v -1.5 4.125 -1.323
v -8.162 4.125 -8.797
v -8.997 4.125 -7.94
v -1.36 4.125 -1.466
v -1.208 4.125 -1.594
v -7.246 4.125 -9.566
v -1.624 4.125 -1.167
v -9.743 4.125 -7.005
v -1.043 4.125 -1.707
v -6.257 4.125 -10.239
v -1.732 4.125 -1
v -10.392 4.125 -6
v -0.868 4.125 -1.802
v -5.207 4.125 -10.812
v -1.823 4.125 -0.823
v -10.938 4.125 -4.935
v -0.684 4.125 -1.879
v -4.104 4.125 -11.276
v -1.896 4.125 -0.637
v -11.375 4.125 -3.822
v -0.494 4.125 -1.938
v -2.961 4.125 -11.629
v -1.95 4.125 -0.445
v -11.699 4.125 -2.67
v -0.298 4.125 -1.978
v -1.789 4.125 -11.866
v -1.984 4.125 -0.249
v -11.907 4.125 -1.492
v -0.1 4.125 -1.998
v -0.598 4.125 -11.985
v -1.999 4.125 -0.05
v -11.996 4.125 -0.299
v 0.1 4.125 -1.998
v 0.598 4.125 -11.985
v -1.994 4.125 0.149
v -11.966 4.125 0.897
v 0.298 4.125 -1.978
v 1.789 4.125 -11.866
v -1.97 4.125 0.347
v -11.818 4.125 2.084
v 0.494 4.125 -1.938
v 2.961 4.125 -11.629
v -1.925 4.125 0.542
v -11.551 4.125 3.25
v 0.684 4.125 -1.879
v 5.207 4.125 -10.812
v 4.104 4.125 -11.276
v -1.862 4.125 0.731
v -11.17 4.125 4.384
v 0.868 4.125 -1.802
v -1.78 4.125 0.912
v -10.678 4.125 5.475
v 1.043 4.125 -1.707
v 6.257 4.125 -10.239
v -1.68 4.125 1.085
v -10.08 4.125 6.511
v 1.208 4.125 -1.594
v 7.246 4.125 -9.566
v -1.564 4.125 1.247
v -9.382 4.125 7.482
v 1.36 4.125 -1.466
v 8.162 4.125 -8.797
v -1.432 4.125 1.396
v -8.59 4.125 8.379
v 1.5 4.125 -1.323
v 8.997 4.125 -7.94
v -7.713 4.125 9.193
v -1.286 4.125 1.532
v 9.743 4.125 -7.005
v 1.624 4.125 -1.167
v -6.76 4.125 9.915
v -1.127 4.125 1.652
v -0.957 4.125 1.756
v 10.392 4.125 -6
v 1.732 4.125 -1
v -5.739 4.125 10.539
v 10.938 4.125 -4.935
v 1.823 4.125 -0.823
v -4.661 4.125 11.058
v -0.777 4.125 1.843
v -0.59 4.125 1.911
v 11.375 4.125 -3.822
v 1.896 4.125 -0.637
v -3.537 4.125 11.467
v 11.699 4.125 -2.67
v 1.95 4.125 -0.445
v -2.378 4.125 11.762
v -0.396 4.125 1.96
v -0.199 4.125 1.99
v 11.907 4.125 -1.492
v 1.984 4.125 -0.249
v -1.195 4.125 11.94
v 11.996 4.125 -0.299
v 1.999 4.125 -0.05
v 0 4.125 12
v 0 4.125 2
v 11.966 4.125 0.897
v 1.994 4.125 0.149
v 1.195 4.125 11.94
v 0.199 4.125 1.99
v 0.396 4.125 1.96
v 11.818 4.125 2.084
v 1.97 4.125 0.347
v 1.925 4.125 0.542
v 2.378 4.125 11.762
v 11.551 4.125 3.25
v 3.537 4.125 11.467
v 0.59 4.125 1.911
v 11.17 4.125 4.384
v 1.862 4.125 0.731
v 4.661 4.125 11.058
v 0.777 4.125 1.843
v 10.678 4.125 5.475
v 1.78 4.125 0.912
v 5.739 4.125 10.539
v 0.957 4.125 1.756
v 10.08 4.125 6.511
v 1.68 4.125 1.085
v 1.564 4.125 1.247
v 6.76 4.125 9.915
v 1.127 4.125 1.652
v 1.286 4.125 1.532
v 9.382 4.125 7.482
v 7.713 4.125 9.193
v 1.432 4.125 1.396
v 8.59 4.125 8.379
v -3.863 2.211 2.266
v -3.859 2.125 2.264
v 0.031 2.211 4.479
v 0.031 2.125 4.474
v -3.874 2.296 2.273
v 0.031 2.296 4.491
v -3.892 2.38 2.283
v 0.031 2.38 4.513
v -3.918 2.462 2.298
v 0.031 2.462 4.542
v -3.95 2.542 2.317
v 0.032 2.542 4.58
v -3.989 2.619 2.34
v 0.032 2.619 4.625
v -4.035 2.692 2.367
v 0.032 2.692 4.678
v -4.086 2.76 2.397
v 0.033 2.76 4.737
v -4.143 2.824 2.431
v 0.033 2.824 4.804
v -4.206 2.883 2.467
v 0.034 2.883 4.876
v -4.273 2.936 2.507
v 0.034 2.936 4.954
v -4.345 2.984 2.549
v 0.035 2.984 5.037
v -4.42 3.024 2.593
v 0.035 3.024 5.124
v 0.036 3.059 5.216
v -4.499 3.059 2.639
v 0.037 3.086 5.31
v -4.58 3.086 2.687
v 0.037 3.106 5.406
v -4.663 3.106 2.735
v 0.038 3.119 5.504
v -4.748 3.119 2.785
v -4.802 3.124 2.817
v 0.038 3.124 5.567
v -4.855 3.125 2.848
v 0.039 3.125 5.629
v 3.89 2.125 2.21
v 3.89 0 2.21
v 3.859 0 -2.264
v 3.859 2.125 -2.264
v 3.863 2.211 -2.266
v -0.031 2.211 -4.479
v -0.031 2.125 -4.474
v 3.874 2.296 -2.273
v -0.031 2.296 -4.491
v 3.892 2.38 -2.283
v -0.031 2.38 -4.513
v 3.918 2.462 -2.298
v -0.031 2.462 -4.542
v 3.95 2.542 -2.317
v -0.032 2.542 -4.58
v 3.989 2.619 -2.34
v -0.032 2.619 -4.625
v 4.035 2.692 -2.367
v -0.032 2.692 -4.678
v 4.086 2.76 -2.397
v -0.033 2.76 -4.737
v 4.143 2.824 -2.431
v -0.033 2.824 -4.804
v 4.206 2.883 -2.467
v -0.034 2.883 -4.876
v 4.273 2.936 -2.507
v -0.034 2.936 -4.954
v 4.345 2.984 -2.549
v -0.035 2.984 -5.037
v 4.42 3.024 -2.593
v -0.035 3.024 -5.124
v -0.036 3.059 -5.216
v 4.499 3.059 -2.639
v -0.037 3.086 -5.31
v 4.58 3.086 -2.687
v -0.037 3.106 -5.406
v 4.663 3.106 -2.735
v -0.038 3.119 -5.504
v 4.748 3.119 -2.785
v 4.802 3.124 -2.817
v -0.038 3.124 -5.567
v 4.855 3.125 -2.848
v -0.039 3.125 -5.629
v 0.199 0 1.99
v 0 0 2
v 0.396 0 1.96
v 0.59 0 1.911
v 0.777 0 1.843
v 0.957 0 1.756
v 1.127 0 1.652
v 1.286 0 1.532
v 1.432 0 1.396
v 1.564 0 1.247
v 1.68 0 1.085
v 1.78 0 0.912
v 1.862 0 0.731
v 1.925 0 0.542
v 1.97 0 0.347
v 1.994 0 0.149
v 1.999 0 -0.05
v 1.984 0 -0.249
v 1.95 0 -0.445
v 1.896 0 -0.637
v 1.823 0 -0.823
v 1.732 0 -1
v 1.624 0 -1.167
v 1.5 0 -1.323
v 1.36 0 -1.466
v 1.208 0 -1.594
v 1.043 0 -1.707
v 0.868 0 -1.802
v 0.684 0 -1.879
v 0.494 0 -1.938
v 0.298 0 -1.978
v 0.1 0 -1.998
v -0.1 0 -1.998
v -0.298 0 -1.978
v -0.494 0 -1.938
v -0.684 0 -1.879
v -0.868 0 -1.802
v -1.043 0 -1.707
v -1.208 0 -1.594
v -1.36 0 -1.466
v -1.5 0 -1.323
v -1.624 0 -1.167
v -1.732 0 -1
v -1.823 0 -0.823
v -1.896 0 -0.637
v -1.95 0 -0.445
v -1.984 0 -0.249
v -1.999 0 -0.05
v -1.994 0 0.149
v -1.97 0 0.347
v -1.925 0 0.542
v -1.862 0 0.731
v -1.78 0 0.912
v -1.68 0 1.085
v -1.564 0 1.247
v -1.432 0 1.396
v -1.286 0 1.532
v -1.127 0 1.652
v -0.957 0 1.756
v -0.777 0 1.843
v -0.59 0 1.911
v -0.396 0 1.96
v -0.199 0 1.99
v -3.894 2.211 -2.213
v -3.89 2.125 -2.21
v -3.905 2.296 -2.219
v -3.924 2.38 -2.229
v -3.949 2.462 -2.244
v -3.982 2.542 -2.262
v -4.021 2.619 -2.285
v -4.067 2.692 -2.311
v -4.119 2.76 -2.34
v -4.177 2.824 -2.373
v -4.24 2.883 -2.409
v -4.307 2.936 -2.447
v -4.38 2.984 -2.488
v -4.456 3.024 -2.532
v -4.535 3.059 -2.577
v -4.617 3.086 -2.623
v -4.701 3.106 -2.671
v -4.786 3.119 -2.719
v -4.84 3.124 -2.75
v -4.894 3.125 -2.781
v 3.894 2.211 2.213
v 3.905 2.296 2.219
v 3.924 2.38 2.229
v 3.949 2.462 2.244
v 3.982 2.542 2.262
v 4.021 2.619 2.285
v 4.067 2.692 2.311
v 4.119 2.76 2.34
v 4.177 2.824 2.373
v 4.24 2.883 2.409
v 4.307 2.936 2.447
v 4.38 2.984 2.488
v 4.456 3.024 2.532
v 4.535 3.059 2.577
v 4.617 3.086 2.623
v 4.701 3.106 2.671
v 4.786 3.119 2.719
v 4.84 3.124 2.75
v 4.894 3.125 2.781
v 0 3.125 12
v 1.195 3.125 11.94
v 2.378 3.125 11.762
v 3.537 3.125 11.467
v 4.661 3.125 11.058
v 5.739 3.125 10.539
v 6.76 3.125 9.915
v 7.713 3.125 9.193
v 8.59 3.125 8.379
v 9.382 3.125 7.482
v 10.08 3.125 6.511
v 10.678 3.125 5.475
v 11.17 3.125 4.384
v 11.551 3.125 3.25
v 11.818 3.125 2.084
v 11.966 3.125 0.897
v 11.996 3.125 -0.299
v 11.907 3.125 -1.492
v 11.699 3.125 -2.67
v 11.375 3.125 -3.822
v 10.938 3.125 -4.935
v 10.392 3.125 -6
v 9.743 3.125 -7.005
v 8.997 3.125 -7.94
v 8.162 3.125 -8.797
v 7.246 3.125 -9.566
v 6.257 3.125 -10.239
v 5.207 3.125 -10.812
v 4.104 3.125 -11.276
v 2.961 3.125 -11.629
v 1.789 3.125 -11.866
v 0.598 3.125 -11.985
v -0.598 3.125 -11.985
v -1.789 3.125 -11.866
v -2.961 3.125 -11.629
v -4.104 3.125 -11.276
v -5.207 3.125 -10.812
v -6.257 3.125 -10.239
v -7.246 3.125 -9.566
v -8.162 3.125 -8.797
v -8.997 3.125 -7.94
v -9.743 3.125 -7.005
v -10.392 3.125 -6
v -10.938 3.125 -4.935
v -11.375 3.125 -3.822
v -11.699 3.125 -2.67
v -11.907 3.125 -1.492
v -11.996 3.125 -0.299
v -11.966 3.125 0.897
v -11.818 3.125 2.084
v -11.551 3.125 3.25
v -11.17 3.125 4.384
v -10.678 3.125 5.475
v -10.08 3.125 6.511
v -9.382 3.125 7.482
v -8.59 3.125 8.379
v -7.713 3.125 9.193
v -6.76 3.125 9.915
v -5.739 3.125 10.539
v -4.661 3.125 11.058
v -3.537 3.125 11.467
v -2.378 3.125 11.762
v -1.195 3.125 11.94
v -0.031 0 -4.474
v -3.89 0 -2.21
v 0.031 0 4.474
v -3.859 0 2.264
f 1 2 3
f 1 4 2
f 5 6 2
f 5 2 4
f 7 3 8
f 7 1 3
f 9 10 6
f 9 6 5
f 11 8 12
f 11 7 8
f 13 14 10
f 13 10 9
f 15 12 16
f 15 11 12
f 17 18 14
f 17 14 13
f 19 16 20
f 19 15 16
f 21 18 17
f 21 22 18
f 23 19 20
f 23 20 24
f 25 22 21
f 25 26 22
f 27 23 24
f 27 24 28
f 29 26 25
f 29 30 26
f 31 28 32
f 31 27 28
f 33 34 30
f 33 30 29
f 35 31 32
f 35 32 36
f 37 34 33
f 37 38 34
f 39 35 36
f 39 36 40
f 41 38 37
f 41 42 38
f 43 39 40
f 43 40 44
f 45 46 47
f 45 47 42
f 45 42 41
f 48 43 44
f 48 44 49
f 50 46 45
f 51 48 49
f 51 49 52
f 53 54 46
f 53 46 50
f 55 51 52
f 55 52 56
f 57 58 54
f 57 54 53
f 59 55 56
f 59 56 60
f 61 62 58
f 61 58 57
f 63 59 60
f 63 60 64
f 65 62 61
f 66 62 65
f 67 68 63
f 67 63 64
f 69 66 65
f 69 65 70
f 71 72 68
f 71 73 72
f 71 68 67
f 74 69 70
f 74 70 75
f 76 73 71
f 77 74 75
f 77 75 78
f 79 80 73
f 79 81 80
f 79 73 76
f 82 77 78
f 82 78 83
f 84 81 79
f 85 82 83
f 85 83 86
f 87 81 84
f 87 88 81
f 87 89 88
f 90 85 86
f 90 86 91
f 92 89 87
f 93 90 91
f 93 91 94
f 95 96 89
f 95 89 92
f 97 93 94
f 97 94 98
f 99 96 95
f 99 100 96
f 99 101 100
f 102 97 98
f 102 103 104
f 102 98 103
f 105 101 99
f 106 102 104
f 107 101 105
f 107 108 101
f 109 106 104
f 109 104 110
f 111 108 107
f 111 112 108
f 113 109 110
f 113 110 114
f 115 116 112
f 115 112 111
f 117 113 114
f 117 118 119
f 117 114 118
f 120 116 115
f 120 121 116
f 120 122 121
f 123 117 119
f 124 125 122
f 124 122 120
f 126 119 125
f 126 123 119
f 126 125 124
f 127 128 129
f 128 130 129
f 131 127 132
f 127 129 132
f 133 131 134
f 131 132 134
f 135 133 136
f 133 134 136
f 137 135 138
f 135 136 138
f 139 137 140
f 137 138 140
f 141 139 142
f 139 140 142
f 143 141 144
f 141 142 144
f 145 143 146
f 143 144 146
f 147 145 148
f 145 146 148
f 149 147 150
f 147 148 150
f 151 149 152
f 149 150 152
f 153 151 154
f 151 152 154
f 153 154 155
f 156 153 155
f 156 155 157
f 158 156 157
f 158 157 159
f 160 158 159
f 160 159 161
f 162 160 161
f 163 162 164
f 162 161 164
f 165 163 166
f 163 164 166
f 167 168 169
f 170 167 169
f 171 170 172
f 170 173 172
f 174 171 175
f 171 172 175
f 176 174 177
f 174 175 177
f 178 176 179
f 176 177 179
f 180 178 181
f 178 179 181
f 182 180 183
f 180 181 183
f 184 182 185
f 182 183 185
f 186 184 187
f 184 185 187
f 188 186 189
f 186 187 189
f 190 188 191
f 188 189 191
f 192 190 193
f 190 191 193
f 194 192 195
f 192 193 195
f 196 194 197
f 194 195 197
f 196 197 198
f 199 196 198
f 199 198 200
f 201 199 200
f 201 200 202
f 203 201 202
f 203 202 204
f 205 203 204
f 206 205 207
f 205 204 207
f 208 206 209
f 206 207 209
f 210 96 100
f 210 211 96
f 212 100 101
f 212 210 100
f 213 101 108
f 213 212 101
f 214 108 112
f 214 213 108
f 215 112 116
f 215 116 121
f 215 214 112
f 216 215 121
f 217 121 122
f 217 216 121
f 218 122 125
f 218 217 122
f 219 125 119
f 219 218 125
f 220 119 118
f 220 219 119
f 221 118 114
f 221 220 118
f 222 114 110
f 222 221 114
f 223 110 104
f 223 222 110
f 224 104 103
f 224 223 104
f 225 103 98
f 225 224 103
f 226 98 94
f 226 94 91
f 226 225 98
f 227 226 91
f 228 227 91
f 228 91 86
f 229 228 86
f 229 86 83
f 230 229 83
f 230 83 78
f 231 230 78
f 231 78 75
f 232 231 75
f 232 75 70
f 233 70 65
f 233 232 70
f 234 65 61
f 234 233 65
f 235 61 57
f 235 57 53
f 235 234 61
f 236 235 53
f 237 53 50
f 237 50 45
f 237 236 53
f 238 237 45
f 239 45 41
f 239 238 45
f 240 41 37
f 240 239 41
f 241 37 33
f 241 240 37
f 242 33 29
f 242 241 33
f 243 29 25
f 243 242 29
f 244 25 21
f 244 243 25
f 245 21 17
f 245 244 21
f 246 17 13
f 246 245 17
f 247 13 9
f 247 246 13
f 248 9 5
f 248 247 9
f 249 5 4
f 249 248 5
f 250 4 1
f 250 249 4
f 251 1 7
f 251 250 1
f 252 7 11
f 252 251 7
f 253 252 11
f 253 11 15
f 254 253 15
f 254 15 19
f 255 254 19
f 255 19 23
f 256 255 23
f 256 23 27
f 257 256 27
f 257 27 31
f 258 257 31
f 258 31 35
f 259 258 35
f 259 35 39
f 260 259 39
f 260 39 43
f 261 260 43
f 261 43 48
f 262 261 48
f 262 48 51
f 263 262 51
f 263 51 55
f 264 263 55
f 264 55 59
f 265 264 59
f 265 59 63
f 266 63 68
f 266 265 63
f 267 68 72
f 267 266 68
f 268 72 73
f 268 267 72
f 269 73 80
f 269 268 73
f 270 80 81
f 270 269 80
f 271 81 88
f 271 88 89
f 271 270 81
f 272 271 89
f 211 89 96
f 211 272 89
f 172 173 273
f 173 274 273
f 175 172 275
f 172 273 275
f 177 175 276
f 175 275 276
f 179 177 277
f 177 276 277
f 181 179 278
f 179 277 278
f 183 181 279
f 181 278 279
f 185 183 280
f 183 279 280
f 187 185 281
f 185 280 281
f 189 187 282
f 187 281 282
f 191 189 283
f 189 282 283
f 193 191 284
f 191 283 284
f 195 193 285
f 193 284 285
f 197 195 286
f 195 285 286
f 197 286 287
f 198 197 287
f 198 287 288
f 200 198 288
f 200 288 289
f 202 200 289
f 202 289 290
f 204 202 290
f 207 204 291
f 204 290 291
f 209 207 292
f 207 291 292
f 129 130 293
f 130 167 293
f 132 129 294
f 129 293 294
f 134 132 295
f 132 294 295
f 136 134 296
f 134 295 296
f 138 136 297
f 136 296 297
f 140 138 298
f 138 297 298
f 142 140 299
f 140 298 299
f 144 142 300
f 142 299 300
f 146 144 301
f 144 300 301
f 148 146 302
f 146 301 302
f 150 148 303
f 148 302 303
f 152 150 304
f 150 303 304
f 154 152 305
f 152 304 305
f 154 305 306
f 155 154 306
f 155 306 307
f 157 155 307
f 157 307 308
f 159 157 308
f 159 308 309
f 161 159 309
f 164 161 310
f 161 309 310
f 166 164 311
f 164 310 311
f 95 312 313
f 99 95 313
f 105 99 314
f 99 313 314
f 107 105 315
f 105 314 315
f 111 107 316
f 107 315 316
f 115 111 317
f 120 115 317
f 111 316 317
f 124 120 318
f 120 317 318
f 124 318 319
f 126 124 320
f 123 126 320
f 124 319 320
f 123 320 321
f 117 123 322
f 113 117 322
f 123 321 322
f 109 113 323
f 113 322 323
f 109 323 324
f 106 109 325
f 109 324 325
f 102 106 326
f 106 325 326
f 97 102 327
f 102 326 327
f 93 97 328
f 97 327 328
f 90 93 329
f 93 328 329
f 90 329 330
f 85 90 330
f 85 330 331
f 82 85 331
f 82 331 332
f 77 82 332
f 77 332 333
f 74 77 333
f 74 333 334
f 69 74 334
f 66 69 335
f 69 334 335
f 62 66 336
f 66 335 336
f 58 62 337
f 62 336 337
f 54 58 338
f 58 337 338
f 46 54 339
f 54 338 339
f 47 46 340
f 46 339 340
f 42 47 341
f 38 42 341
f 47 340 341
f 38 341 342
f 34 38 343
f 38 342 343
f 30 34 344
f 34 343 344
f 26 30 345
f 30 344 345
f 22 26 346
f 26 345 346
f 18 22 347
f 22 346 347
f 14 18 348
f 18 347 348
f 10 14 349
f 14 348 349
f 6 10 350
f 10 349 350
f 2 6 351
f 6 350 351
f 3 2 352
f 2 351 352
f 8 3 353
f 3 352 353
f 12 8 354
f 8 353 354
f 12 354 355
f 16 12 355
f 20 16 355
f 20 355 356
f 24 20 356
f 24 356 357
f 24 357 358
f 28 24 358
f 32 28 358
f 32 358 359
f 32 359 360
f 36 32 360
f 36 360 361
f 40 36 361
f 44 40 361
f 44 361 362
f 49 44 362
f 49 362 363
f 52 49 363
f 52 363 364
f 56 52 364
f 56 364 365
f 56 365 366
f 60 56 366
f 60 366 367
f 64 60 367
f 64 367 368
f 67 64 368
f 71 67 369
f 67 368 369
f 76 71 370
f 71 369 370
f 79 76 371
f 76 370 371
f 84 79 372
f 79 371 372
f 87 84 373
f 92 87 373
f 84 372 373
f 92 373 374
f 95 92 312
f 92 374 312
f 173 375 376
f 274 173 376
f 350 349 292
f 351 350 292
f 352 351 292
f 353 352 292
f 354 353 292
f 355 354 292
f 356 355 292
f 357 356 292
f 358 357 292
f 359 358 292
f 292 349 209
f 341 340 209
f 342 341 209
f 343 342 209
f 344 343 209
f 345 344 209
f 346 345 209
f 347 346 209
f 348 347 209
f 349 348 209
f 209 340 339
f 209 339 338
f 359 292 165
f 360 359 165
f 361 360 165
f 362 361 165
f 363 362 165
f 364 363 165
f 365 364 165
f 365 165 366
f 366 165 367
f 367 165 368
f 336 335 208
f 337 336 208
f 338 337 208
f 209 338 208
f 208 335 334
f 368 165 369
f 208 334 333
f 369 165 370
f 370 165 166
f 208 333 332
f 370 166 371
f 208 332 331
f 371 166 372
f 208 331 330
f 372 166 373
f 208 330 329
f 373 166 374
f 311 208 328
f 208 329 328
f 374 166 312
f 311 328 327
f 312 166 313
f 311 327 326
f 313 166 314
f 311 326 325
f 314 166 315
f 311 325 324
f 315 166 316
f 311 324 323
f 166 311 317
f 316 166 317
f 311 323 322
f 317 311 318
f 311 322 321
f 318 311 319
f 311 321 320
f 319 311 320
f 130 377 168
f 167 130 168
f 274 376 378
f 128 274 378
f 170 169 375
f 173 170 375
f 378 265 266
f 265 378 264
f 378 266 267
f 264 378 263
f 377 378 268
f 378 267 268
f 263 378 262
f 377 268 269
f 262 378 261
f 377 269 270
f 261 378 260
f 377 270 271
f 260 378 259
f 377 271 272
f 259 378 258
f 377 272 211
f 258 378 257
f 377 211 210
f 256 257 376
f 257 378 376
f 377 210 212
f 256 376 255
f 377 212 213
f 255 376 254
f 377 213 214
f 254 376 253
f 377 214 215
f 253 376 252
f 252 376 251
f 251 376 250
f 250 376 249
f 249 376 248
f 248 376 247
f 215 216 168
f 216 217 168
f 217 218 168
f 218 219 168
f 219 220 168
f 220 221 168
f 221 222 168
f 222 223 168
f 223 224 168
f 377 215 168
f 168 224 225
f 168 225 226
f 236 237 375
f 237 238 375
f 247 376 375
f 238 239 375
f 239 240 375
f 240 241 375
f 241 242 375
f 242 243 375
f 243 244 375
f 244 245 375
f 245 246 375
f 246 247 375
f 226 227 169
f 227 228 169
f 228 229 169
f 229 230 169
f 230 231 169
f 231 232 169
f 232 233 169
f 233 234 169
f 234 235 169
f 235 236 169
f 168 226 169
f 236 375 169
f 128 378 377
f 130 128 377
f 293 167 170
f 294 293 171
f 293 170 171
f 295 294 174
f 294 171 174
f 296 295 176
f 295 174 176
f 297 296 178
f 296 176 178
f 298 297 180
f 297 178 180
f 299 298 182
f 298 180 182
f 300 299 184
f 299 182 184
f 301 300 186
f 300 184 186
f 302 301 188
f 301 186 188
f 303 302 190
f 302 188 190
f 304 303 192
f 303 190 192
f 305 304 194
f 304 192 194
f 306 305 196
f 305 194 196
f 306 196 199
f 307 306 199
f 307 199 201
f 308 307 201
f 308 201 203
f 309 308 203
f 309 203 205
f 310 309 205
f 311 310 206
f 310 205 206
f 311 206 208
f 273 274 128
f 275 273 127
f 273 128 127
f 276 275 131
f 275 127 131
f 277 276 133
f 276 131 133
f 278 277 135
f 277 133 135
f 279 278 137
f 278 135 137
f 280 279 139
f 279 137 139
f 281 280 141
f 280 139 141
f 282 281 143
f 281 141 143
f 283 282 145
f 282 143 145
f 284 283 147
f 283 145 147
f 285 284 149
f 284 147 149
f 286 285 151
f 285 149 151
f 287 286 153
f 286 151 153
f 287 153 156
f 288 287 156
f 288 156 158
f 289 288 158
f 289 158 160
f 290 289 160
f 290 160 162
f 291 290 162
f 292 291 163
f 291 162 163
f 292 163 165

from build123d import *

# Parameters (mm, degrees)
SKETCH1_R                = 2
EXTRUDE1_DEPTH           = 3.125
ESBO_O1_R                = 12
ESBO_O1_R_2              = 2
RESSALTO_EXTRUS_O1_DEPTH = 1
FILETE1_R                = 1


with BuildPart() as part:
    # Sketch1 → Extrude1 (new body)
    with BuildSketch(Plane(origin=(0, 0, 0), x_dir=(1, 0, 0), z_dir=(0, 1, 0))):
        Polygon((3.859462612, 2.263930582), (-0.030890091, 4.474357958), (-3.890352703, 2.210427376), (-3.859462612, -2.263930582), (0.030890091, -4.474357958), (3.890352703, -2.210427376), align=None)
        with Locations(Location((0, 0, 0), (0, 0, 270))):  # turned: the seam where the file's is
            Circle(SKETCH1_R, mode=Mode.SUBTRACT)
    extrude(amount=EXTRUDE1_DEPTH)

    # Esboço1 → Ressalto-extrusão1 (add)
    with BuildSketch(Plane(origin=(0, 3.125, 0), x_dir=(1, 0, 0), z_dir=(0, 1, 0))):
        with Locations(Location((0, 0, 0), (0, 0, 270))):  # turned: the seam where the file's is
            Circle(ESBO_O1_R)
        with Locations(Location((0, 0, 0), (0, 0, 270))):  # turned: the seam where the file's is
            Circle(ESBO_O1_R_2, mode=Mode.SUBTRACT)
    extrude(amount=RESSALTO_EXTRUS_O1_DEPTH)

    # Filete1
    filete1_edges = [part.edges().sort_by_distance(p)[0] for p in [
        (-1.960621397, 3.125, -3.342392667),
        (-3.874907657, 3.125, 0.026751603),
        (-1.91428626, 3.125, 3.36914427),
        (1.960621397, 3.125, 3.342392667),
        (3.874907657, 3.125, -0.026751603),
        (1.91428626, 3.125, -3.36914427),
    ]]
    fillet(filete1_edges, radius=FILETE1_R)


solid = part.part
